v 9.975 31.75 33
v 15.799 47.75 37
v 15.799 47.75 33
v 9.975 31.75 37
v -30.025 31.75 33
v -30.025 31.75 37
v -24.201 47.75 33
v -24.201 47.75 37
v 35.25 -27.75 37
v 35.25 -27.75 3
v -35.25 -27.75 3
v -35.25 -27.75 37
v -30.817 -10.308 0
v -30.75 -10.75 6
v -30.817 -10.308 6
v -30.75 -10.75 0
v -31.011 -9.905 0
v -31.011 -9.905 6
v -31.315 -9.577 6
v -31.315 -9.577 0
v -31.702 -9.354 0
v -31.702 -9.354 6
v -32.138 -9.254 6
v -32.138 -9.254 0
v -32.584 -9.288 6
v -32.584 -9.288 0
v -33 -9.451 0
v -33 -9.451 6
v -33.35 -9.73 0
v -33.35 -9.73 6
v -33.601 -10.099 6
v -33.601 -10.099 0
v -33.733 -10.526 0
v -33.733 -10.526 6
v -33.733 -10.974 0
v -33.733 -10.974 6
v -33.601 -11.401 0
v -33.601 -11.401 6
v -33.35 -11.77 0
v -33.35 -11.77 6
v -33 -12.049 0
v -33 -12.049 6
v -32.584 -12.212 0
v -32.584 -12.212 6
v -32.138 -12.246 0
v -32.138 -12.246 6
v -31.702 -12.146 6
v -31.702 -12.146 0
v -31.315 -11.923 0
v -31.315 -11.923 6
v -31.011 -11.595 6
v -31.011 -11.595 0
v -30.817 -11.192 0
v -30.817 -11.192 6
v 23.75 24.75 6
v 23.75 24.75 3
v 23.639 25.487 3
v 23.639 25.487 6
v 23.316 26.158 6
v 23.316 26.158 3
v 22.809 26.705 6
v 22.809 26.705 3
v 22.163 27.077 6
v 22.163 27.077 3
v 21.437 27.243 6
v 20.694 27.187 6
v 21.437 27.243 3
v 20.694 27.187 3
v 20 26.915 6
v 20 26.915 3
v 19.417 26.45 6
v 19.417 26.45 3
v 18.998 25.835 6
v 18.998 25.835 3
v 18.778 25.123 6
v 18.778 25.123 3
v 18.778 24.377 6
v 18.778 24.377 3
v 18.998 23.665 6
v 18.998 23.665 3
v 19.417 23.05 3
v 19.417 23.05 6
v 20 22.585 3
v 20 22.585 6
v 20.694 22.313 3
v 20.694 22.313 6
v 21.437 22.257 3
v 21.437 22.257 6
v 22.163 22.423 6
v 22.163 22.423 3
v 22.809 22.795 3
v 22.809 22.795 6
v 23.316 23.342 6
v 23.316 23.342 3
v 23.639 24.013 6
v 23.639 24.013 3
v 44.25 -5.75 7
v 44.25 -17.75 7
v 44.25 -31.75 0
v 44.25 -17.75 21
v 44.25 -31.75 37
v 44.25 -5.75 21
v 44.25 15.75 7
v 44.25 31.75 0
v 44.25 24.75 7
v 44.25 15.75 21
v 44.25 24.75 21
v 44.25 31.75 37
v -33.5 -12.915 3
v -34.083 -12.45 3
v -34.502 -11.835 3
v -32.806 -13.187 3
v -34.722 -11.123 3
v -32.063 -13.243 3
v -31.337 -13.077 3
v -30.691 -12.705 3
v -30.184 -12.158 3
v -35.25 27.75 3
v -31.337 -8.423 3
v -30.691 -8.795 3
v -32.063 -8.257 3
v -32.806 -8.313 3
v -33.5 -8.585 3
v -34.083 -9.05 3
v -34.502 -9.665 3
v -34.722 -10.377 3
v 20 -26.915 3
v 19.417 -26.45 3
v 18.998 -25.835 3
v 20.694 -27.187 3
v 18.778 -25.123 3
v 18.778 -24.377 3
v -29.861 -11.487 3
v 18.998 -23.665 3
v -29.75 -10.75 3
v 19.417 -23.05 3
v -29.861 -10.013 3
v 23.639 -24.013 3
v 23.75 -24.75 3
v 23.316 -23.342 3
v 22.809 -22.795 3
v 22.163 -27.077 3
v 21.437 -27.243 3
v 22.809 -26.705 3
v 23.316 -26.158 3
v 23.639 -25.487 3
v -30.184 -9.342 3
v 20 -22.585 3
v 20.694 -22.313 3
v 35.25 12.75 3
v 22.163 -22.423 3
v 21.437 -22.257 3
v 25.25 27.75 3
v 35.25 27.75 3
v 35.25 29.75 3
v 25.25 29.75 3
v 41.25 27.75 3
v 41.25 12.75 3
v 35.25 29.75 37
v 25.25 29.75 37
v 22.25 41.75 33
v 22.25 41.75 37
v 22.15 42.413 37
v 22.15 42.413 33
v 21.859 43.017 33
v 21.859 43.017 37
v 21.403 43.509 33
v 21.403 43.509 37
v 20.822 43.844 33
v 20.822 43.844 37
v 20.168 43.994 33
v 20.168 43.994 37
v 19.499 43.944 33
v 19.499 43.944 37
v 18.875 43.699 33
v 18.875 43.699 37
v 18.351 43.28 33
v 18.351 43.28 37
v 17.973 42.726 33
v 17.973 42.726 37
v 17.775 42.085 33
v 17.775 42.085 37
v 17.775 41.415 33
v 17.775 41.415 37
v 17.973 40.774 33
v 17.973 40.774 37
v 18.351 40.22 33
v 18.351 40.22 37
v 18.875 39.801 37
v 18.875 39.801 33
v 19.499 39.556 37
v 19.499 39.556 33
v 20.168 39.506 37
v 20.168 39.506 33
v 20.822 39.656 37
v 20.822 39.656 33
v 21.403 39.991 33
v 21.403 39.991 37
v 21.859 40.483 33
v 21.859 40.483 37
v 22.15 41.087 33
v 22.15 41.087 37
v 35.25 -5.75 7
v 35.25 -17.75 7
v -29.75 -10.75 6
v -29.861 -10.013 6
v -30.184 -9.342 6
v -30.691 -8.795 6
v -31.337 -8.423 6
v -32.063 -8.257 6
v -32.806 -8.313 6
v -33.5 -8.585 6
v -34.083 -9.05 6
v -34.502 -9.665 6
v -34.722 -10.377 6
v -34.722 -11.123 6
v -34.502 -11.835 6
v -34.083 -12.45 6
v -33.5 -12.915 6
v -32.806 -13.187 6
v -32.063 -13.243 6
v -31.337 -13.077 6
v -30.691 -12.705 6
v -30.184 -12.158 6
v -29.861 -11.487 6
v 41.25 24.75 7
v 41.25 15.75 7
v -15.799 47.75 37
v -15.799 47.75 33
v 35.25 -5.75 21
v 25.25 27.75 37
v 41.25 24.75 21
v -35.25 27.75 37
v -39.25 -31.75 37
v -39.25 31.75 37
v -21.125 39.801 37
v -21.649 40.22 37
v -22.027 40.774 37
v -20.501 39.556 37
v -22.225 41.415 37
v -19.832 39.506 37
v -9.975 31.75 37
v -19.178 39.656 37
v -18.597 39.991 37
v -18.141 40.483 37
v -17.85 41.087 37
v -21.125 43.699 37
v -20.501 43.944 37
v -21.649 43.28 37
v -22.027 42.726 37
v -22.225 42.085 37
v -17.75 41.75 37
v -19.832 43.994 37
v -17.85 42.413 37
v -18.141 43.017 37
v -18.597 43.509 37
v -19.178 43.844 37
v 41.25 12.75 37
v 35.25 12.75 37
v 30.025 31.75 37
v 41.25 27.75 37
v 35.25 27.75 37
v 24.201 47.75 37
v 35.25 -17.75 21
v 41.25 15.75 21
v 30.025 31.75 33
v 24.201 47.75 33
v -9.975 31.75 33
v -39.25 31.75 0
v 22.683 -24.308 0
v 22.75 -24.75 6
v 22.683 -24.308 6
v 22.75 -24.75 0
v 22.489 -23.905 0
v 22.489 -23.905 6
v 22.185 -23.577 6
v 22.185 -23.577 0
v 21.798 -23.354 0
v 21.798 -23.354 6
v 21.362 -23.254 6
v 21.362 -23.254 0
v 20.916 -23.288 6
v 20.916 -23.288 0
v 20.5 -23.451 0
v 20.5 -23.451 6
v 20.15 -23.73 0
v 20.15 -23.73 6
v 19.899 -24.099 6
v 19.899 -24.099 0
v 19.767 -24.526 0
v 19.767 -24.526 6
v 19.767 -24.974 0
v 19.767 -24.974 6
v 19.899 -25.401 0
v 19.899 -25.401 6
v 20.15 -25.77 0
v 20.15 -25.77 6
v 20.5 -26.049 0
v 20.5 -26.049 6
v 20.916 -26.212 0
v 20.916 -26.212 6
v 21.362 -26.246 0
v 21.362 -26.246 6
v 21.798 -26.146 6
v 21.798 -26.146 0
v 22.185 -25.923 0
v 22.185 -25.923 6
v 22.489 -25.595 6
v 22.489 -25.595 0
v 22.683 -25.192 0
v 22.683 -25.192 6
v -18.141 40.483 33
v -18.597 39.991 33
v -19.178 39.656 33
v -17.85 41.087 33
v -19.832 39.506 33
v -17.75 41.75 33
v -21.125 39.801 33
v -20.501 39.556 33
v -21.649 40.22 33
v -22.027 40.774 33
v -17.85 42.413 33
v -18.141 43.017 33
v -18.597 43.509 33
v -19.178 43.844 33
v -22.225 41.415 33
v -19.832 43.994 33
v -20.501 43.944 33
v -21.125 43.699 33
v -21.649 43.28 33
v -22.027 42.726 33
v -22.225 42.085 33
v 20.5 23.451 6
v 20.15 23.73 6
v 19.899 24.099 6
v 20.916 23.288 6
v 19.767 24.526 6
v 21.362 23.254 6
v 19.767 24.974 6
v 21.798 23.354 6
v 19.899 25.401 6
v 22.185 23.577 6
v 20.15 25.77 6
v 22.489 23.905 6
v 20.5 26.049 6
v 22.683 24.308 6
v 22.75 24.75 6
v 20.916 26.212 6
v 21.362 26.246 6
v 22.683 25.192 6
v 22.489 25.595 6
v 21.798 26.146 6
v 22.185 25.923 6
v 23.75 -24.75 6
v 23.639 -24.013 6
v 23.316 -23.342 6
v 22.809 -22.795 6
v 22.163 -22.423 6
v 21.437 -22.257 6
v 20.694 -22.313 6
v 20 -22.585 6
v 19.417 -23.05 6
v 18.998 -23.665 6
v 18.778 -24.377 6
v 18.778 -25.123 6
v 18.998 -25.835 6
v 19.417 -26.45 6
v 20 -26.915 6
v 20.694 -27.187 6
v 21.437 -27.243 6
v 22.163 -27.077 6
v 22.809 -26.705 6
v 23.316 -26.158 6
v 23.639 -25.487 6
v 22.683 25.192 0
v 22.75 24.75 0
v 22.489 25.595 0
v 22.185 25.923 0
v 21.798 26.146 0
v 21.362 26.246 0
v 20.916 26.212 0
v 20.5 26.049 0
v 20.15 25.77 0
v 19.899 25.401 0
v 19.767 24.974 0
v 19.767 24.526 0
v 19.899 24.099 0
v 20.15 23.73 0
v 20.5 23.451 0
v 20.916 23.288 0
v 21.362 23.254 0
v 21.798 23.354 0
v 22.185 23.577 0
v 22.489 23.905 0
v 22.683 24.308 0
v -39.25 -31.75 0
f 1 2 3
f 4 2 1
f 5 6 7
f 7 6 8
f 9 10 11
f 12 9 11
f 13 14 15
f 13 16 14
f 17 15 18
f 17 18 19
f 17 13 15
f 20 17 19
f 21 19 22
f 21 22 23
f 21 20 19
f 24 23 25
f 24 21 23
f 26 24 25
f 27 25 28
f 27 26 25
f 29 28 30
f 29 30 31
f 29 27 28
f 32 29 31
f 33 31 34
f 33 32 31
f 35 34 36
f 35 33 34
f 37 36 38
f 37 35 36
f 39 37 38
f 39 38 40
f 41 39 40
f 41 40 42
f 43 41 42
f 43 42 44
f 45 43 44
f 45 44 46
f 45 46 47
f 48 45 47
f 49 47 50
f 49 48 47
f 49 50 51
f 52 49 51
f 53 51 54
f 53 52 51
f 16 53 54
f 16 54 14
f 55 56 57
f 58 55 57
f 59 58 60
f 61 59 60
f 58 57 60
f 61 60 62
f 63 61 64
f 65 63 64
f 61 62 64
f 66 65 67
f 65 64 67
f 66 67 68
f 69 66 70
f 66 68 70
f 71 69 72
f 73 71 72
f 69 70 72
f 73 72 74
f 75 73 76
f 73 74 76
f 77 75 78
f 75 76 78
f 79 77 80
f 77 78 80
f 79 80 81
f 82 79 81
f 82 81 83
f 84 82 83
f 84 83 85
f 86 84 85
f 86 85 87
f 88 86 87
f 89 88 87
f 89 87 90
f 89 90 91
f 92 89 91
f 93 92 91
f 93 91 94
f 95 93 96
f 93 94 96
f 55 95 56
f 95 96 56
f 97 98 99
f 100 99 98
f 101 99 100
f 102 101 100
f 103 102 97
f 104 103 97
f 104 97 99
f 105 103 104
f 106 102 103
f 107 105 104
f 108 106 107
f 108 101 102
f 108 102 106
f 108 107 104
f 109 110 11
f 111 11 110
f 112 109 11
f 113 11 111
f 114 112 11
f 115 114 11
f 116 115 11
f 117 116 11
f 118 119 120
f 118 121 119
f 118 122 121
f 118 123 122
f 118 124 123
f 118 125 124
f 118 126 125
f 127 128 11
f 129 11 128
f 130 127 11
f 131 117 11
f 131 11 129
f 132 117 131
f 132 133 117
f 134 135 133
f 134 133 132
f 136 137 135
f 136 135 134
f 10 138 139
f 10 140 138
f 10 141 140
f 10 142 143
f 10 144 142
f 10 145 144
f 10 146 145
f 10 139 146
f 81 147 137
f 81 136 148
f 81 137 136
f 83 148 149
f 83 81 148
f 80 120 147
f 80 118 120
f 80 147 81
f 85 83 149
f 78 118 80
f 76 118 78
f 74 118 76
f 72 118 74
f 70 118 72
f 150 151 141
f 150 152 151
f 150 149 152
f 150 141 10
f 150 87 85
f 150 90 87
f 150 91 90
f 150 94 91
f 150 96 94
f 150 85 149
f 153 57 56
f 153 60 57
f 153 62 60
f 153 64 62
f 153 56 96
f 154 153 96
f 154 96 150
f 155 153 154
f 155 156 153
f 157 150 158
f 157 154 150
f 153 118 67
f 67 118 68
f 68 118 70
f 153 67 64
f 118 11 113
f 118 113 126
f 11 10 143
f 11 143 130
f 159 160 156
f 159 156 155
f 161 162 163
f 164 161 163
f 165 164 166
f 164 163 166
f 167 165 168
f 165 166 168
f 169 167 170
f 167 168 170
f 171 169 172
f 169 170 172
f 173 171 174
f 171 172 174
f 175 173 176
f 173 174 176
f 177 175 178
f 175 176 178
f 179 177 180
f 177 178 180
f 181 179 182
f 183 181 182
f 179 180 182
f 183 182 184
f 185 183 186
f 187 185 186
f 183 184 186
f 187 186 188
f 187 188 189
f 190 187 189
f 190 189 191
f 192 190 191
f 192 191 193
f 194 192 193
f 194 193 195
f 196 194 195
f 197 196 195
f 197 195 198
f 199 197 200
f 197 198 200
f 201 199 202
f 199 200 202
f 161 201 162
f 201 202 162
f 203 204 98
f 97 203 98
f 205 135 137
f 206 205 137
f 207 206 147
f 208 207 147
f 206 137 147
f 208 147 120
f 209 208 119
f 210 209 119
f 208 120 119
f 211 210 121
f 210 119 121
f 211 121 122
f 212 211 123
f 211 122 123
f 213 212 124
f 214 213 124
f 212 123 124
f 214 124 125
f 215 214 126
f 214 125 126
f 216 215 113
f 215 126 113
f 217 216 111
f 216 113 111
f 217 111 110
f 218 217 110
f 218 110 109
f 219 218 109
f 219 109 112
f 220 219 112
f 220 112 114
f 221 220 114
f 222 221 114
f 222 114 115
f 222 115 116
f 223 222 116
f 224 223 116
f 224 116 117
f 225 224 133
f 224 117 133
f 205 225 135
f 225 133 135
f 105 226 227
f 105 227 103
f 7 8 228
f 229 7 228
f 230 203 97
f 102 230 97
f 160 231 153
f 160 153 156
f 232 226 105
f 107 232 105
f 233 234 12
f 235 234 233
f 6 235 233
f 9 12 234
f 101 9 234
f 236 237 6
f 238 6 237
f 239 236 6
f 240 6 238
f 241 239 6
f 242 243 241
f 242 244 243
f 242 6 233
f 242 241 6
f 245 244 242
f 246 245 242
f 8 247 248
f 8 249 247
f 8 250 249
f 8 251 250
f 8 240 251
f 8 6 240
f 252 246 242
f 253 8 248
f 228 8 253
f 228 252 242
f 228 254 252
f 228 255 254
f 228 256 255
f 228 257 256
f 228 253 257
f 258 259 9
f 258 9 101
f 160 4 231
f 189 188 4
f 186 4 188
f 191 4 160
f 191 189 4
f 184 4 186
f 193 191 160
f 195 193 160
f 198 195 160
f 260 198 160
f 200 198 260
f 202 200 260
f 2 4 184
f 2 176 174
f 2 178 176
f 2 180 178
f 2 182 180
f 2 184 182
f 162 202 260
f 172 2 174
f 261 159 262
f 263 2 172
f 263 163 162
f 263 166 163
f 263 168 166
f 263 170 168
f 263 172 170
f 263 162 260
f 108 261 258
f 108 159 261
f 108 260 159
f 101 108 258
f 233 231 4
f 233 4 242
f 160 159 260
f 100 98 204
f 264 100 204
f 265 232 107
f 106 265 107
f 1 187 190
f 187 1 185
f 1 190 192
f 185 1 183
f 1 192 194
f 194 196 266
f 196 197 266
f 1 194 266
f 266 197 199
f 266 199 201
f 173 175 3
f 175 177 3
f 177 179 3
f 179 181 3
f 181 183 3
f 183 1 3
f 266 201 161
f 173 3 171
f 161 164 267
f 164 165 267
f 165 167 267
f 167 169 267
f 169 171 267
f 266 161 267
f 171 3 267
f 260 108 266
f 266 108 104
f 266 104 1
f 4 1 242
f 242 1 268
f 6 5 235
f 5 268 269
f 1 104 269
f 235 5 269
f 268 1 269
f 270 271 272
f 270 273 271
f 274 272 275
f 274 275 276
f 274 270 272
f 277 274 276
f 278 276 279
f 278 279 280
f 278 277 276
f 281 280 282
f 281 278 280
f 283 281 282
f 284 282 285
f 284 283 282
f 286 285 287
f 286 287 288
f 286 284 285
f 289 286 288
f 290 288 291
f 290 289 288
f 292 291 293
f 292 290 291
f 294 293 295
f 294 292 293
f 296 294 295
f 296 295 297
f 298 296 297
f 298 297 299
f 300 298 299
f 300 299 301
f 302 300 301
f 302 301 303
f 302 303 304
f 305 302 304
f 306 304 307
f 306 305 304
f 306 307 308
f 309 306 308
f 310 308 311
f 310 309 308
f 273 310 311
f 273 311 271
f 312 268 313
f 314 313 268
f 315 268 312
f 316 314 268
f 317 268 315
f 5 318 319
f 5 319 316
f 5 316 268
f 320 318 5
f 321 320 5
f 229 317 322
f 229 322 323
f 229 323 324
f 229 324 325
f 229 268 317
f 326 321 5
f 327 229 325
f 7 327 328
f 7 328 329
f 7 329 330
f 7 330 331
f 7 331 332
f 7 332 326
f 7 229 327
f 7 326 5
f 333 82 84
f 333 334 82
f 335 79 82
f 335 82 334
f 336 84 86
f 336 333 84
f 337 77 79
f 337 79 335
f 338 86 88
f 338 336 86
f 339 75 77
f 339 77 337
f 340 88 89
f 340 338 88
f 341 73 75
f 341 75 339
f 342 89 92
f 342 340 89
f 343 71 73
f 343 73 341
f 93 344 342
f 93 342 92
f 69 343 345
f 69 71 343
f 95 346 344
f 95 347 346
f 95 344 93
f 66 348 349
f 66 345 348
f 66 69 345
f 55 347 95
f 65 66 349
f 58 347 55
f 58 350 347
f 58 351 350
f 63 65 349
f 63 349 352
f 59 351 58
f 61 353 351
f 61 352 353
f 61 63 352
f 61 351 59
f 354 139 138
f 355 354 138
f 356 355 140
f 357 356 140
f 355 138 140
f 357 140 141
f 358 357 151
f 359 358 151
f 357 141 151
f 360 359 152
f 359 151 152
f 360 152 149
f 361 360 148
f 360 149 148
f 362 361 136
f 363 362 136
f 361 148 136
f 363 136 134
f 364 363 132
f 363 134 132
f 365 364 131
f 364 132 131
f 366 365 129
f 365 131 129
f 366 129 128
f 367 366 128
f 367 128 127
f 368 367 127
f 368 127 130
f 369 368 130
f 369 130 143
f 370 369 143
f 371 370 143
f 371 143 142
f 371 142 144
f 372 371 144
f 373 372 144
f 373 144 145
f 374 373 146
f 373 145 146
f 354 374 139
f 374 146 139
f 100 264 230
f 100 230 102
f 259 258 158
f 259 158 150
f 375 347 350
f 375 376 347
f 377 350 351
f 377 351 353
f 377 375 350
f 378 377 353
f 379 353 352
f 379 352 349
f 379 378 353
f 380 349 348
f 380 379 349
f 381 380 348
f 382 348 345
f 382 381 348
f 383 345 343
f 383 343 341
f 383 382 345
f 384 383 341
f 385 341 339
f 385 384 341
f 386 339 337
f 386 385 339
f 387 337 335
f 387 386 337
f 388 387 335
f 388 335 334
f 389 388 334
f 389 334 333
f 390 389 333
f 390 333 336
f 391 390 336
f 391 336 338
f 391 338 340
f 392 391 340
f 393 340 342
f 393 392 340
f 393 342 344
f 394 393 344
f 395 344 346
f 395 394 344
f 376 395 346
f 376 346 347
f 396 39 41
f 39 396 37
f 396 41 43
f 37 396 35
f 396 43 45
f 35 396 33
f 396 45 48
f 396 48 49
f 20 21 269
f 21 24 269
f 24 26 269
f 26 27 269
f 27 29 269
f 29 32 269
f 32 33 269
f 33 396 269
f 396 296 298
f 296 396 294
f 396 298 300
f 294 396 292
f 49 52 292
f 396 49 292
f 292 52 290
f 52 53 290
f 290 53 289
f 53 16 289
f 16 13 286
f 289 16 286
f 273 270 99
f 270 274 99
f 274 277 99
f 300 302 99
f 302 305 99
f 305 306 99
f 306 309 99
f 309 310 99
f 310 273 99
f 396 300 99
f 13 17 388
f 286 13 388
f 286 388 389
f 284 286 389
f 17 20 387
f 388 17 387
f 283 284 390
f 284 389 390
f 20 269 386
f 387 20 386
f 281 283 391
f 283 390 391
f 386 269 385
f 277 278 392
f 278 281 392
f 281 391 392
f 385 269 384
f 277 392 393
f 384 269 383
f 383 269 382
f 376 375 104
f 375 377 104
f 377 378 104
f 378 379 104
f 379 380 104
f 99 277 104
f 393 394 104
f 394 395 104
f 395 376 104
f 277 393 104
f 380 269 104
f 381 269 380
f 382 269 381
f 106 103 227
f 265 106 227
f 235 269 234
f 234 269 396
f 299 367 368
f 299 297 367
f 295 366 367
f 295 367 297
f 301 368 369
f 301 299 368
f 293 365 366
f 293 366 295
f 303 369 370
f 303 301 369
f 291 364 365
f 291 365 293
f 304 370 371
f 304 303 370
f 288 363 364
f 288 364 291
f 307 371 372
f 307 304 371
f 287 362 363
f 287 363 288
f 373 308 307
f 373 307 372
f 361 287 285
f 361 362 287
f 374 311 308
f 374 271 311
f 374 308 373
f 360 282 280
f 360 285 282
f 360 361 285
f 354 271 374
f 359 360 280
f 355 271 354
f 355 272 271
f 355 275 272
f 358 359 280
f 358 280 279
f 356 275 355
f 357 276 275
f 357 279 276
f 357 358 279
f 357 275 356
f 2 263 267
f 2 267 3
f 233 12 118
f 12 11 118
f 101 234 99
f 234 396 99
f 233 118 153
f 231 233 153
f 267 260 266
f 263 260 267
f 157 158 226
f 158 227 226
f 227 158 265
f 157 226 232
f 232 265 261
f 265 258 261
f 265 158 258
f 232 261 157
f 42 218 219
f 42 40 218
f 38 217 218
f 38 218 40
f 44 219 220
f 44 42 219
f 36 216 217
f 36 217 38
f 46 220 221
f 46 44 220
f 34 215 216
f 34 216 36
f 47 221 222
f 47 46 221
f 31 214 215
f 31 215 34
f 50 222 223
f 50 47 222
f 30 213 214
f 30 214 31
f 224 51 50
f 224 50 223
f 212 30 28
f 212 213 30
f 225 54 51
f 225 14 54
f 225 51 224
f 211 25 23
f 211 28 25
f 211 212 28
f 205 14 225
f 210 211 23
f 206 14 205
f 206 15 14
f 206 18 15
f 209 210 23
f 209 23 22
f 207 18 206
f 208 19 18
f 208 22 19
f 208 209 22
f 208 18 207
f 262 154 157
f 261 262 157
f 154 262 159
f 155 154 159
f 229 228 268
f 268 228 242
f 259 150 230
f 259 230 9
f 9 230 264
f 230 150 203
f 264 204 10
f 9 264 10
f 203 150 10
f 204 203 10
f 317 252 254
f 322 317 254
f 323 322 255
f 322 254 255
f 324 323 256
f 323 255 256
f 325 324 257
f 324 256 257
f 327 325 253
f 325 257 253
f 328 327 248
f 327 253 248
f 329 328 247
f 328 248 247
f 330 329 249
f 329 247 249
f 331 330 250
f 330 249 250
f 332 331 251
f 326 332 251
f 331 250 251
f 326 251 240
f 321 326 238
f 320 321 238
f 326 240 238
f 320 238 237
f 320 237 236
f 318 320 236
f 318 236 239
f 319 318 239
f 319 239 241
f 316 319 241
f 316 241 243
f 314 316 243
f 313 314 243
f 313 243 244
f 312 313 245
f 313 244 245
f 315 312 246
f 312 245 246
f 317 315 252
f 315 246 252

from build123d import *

# Parameters (mm, degrees)
SKETCH_1_W          = 83.5
SKETCH_1_H          = 63.5
SKETCH_1_R          = 1.5
EXTRUDE_1_DEPTH     = 3
EXTRUDE_START       = 3
EXTRUDE_2_DEPTH     = 15
EXTRUDE_START_2     = 18
EXTRUDE_3_DEPTH     = 19
SKETCH_1_5_W        = 3
SKETCH_1_5_H        = 9
EXTRUDE_6_DEPTH     = 4
SKETCH_6_R          = 2.25
EXTRUDE_7_DEPTH     = 4
SKETCH_7_W          = 3
SKETCH_7_H          = 9
SKETCH_7_W_2        = 9
SKETCH_7_H_2        = 12
EXTRUDE_8_DEPTH     = 16
SKETCH_8_W          = 10
SKETCH_8_H          = 2
CUT_EXTRUDE_1_DEPTH = 34
SKETCH_9_R          = 2.5
SKETCH_9_R_2        = 1.5
EXTRUDE_17_DEPTH    = 3


with BuildPart() as part:
    # 草图1 → 凸台-拉伸1 (new body)
    with BuildSketch(Plane.XY):
        with Locations((2.5, 0)):
            Rectangle(SKETCH_1_W, SKETCH_1_H)
        with Locations((21.25, -24.75)):
            Circle(SKETCH_1_R, mode=Mode.SUBTRACT)
        with Locations((21.25, 24.75)):
            Circle(SKETCH_1_R, mode=Mode.SUBTRACT)
        with Locations((-32.25, -10.75)):
            Circle(SKETCH_1_R, mode=Mode.SUBTRACT)
    extrude(amount=EXTRUDE_1_DEPTH)

    # 草图1<3> → 凸台-拉伸2 (add)
    with BuildSketch(Plane.XY.offset(EXTRUDE_START)):
        Polygon((35.25, -27.75), (-35.25, -27.75), (-35.25, 27.75), (41.25, 27.75), (41.25, 24.75), (44.25, 24.75), (44.25, 31.75), (-39.25, 31.75), (-39.25, -31.75), (44.25, -31.75), (44.25, -17.75), (35.25, -17.75), align=None)
        Polygon((35.25, 12.75), (35.25, -5.75), (44.25, -5.75), (44.25, 15.75), (41.25, 15.75), (41.25, 12.75), align=None)
    extrude(amount=EXTRUDE_2_DEPTH)

    # 草图1<4> → 凸台-拉伸3 (add)
    with BuildSketch(Plane.XY.offset(EXTRUDE_START_2)):
        Polygon((35.25, -27.75), (-35.25, -27.75), (-35.25, 27.75), (41.25, 27.75), (41.25, 24.75), (44.25, 24.75), (44.25, 31.75), (-39.25, 31.75), (-39.25, -31.75), (44.25, -31.75), (44.25, -17.75), (35.25, -17.75), align=None)
        Polygon((35.25, 12.75), (35.25, -5.75), (44.25, -5.75), (44.25, 15.75), (41.25, 15.75), (41.25, 12.75), align=None)
    extrude(amount=EXTRUDE_3_DEPTH)

    # 草图1<5> → 凸台-拉伸6 (add)
    with BuildSketch(Plane.XY.offset(EXTRUDE_START)):
        with Locations((42.75, 20.25)):
            Rectangle(SKETCH_1_5_W, SKETCH_1_5_H)
        Polygon((35.25, -5.75), (35.25, -17.75), (41.25, -17.75), (44.25, -17.75), (44.25, -5.75), (41.25, -5.75), align=None)
    extrude(amount=EXTRUDE_6_DEPTH)

    # 草图6 → 凸台-拉伸7 (add)
    # profile 1 of 2: a face of its own
    with BuildSketch(Plane.XY.offset(37)):
        Polygon((30.024768978, 31.75), (24.201245229, 47.75), (15.798754771, 47.75), (9.975231022, 31.75), align=None)
        with Locations((20, 41.75)):
            Circle(SKETCH_6_R, mode=Mode.SUBTRACT)
    # profile 2 of 2: a face of its own
    with BuildSketch(Plane.XY.offset(37)):
        Polygon((-24.201245229, 47.75), (-15.798754771, 47.75), (-9.975231022, 31.75), (-30.024768978, 31.75), align=None)
        with Locations((-20, 41.75)):
            Circle(SKETCH_6_R, mode=Mode.SUBTRACT)
    extrude(amount=-EXTRUDE_7_DEPTH)

    # 草图7 → 凸台-拉伸8 (add)
    with BuildSketch(Plane.XY.offset(37)):
        with Locations((42.75, 20.25)):
            Rectangle(SKETCH_7_W, SKETCH_7_H)
        with Locations((39.75, -11.75)):
            Rectangle(SKETCH_7_W_2, SKETCH_7_H_2)
    extrude(amount=-EXTRUDE_8_DEPTH)

    # 草图8 → 切除-拉伸1 (cut)
    with BuildSketch(Plane.XY.offset(37)):
        with Locations((30.25, 28.75)):
            Rectangle(SKETCH_8_W, SKETCH_8_H)
    extrude(amount=-CUT_EXTRUDE_1_DEPTH, mode=Mode.SUBTRACT)

    # 草图9 → 凸台-拉伸17 (add)
    # profile 1 of 3: a face of its own
    with BuildSketch(Plane.XY.offset(3)):
        with Locations((-32.25, -10.75)):
            Circle(SKETCH_9_R)
        with Locations((-32.25, -10.75)):
            Circle(SKETCH_9_R_2, mode=Mode.SUBTRACT)
    # profile 2 of 3: a face of its own
    with BuildSketch(Plane.XY.offset(3)):
        with Locations((21.25, 24.75)):
            Circle(SKETCH_9_R)
        with Locations((21.25, 24.75)):
            Circle(SKETCH_9_R_2, mode=Mode.SUBTRACT)
    # profile 3 of 3: a face of its own
    with BuildSketch(Plane.XY.offset(3)):
        with Locations((21.25, -24.75)):
            Circle(SKETCH_9_R)
        with Locations((21.25, -24.75)):
            Circle(SKETCH_9_R_2, mode=Mode.SUBTRACT)
    extrude(amount=EXTRUDE_17_DEPTH)


solid = part.part
